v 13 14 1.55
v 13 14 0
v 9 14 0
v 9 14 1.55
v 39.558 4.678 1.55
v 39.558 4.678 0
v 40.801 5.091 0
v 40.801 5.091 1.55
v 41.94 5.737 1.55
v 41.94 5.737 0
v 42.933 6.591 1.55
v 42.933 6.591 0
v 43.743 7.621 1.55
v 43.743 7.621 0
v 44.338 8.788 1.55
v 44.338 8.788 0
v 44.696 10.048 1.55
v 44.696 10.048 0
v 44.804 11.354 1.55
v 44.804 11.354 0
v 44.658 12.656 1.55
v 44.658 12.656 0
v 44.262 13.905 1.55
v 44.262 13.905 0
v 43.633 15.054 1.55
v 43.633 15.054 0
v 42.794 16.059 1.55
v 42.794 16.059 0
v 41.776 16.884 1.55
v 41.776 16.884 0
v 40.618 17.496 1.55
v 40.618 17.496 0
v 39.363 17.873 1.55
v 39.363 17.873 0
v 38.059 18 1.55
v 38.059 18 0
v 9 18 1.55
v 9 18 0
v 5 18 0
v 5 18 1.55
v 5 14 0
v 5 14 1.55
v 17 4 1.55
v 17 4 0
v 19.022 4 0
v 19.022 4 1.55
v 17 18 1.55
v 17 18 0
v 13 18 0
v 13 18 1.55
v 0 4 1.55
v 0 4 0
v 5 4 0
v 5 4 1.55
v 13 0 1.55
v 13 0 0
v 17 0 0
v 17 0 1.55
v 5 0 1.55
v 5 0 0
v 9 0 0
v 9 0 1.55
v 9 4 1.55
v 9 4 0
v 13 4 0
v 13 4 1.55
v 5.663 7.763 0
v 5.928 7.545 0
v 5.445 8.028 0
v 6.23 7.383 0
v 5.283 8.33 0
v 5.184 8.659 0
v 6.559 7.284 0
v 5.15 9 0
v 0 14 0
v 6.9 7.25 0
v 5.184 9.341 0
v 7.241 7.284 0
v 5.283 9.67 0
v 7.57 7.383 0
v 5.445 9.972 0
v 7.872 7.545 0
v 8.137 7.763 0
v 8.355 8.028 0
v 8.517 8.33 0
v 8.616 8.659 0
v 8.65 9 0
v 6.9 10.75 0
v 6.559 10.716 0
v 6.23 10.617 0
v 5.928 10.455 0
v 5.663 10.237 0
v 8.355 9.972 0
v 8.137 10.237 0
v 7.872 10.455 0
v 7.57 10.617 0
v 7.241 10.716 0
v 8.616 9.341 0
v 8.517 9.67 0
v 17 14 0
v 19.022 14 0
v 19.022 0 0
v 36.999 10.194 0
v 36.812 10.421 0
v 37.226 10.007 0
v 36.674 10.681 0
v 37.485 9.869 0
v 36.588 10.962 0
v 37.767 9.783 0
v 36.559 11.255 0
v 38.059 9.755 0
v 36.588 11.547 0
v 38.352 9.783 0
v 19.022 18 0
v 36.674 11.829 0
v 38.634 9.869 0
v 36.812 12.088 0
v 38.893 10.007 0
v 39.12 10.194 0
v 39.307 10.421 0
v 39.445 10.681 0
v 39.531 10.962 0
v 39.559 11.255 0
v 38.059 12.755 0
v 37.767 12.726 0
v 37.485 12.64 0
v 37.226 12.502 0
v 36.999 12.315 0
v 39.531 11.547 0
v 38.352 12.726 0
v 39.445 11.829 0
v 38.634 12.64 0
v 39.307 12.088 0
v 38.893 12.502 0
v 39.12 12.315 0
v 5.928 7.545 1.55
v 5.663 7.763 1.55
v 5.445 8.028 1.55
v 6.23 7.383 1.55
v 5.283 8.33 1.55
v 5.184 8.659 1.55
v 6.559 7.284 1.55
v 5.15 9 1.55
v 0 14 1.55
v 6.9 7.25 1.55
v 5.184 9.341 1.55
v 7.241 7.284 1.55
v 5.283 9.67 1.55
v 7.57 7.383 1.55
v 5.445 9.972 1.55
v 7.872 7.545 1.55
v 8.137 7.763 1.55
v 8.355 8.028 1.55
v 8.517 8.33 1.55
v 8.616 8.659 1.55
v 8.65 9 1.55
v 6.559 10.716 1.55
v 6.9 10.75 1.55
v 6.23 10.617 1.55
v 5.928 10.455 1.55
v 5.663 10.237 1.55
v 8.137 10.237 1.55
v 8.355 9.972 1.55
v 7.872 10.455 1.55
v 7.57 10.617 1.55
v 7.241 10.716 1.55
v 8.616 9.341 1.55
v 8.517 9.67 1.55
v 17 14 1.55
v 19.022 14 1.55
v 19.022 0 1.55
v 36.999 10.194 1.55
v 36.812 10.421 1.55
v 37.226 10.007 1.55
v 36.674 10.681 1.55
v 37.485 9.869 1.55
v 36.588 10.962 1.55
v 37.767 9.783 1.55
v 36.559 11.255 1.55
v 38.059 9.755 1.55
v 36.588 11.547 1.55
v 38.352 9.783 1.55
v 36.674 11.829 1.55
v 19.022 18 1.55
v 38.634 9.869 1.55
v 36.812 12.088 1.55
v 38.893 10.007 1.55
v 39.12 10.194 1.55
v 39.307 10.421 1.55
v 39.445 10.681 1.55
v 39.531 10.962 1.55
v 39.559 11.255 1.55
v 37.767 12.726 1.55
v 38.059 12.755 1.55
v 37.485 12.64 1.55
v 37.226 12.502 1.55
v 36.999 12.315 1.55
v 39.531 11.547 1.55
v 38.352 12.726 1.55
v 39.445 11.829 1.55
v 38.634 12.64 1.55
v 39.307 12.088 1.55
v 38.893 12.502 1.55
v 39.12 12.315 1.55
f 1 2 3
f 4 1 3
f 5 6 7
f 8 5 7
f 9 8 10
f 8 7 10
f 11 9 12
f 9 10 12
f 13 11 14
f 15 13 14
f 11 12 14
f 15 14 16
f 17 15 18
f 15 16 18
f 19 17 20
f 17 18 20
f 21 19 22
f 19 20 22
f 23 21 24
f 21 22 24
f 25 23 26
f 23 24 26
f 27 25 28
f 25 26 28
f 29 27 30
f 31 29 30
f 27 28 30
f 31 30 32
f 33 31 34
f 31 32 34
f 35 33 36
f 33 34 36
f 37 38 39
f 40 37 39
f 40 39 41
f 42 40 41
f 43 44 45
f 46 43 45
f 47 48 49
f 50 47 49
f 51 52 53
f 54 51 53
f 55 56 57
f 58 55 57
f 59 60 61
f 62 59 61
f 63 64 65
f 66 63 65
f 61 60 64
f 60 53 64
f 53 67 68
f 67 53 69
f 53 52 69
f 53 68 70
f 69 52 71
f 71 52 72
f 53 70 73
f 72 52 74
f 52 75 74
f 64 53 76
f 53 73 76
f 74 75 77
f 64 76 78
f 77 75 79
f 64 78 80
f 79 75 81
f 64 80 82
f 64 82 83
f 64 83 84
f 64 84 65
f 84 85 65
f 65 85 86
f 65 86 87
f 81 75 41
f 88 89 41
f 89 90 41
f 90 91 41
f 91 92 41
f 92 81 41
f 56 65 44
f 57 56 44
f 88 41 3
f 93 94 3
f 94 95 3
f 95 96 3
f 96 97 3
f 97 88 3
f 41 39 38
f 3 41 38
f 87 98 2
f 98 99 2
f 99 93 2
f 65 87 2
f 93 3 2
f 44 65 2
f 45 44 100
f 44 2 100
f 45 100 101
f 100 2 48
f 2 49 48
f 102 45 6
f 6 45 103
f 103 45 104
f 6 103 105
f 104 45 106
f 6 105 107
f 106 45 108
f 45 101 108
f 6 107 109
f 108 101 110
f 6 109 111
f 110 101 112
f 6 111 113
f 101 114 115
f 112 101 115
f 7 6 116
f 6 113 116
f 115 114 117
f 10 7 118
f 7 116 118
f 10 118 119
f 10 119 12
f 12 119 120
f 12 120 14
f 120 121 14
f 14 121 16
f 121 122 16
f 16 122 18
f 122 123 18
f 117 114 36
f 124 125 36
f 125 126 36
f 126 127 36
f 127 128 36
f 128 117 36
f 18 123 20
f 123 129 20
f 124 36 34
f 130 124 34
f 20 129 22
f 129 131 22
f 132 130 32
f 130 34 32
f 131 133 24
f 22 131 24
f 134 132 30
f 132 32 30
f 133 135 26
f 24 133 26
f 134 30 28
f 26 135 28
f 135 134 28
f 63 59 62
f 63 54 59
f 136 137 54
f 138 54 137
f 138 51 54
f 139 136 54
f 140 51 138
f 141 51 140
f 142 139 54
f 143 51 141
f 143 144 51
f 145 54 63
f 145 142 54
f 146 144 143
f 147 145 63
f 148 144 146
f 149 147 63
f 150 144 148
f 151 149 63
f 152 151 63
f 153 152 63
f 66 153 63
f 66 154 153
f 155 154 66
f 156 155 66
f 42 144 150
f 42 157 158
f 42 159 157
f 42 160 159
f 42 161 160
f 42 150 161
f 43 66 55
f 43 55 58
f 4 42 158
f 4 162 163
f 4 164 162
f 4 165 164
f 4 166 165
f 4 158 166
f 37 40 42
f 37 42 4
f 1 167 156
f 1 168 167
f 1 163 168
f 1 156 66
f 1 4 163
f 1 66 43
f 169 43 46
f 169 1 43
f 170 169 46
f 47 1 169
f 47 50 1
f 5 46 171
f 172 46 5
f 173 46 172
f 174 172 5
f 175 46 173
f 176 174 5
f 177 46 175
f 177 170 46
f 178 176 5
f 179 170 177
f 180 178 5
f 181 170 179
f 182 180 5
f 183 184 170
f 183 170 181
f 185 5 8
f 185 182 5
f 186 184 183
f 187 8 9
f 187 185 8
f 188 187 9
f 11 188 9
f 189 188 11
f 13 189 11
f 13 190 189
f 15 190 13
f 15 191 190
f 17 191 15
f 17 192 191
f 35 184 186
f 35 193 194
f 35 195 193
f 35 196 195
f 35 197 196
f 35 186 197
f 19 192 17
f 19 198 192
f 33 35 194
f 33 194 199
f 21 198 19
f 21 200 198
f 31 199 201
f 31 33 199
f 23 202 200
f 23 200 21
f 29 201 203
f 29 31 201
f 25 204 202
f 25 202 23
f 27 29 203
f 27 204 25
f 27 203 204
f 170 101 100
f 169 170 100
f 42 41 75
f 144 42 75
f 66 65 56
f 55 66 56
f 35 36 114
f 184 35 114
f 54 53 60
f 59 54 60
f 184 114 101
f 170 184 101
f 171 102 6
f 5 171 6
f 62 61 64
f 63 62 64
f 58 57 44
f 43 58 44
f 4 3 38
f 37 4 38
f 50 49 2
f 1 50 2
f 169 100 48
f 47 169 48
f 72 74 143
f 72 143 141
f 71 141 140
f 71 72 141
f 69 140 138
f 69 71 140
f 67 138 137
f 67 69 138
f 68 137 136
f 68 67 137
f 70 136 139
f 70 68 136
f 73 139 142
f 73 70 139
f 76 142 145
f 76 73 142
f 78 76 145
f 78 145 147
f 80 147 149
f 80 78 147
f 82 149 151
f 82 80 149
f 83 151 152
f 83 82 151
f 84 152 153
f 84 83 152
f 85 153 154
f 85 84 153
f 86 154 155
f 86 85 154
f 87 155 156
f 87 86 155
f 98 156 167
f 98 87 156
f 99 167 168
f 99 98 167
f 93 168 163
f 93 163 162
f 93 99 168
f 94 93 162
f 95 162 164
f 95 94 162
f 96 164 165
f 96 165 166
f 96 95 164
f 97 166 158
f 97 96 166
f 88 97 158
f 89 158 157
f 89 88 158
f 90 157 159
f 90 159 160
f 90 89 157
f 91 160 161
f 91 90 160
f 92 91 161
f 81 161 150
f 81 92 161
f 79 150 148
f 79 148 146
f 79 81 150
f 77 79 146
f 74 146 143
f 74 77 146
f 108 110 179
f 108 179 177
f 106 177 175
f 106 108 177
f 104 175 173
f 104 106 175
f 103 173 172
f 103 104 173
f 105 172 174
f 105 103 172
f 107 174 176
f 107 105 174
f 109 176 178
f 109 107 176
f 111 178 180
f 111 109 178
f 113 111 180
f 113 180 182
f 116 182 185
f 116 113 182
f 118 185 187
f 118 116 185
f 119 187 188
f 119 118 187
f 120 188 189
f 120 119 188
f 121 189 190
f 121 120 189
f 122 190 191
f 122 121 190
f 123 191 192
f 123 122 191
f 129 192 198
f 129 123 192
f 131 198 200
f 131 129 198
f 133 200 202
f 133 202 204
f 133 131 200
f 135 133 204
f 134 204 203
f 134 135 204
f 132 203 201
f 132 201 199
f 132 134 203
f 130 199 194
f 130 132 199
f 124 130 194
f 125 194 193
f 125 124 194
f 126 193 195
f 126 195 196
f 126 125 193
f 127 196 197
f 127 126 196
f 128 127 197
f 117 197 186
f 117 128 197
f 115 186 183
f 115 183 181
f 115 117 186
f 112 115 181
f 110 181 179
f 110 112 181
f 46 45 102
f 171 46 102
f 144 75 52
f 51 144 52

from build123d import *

# Parameters (mm, degrees)
SKETCH1_R           = 1.75
SKETCH1_R_2         = 1.5
BOSS_EXTRUDE1_DEPTH = 1.55


with BuildPart() as part:
    # Sketch1 → Boss-Extrude1 (new body)
    with BuildSketch(Plane.XY):
        with BuildLine():
            Line((5, 0), (9, 0))
            Line((9, 0), (9, 4))
            Line((9, 4), (13, 4))
            Line((13, 4), (13, 0))
            Line((13, 0), (17, 0))
            Line((17, 0), (17, 4))
            Line((17, 4), (19.021561934, 4))
            Line((19.021561934, 4), (19.021561934, 0))
            Line((19.021561934, 0), (39.557599026, 4.677766061))
            ThreePointArc((39.557599026, 4.677766061), (44.762590659, 12.008417985), (38.059495851, 17.999988357))
            Line((38.059495851, 17.999988357), (19.021561934, 17.999988357))
            Line((19.021561934, 17.999988357), (19.021561934, 13.999988357))
            Line((19.021561934, 13.999988357), (17, 13.999988357))
            Line((17, 13.999988357), (17, 17.999988357))
            Line((17, 17.999988357), (13, 17.999988357))
            Line((13, 17.999988357), (13, 13.999988357))
            Line((13, 13.999988357), (9, 13.999988357))
            Line((9, 13.999988357), (9, 17.999988357))
            Line((9, 17.999988357), (5, 17.999988357))
            Line((5, 17.999988357), (5, 13.999988357))
            Line((5, 13.999988357), (0, 13.999988357))
            Line((0, 13.999988357), (0, 4))
            Line((0, 4), (5, 4))
            Line((5, 4), (5, 0))
        make_face()
        with Locations(Location((6.9, 9, 0), (0, 0, 180))):
            Circle(SKETCH1_R, mode=Mode.SUBTRACT)
        with Locations(Location((38.059495851, 11.254645274, 0), (0, 0, 180))):
            Circle(SKETCH1_R_2, mode=Mode.SUBTRACT)
    extrude(amount=BOSS_EXTRUDE1_DEPTH)


solid = part.part
